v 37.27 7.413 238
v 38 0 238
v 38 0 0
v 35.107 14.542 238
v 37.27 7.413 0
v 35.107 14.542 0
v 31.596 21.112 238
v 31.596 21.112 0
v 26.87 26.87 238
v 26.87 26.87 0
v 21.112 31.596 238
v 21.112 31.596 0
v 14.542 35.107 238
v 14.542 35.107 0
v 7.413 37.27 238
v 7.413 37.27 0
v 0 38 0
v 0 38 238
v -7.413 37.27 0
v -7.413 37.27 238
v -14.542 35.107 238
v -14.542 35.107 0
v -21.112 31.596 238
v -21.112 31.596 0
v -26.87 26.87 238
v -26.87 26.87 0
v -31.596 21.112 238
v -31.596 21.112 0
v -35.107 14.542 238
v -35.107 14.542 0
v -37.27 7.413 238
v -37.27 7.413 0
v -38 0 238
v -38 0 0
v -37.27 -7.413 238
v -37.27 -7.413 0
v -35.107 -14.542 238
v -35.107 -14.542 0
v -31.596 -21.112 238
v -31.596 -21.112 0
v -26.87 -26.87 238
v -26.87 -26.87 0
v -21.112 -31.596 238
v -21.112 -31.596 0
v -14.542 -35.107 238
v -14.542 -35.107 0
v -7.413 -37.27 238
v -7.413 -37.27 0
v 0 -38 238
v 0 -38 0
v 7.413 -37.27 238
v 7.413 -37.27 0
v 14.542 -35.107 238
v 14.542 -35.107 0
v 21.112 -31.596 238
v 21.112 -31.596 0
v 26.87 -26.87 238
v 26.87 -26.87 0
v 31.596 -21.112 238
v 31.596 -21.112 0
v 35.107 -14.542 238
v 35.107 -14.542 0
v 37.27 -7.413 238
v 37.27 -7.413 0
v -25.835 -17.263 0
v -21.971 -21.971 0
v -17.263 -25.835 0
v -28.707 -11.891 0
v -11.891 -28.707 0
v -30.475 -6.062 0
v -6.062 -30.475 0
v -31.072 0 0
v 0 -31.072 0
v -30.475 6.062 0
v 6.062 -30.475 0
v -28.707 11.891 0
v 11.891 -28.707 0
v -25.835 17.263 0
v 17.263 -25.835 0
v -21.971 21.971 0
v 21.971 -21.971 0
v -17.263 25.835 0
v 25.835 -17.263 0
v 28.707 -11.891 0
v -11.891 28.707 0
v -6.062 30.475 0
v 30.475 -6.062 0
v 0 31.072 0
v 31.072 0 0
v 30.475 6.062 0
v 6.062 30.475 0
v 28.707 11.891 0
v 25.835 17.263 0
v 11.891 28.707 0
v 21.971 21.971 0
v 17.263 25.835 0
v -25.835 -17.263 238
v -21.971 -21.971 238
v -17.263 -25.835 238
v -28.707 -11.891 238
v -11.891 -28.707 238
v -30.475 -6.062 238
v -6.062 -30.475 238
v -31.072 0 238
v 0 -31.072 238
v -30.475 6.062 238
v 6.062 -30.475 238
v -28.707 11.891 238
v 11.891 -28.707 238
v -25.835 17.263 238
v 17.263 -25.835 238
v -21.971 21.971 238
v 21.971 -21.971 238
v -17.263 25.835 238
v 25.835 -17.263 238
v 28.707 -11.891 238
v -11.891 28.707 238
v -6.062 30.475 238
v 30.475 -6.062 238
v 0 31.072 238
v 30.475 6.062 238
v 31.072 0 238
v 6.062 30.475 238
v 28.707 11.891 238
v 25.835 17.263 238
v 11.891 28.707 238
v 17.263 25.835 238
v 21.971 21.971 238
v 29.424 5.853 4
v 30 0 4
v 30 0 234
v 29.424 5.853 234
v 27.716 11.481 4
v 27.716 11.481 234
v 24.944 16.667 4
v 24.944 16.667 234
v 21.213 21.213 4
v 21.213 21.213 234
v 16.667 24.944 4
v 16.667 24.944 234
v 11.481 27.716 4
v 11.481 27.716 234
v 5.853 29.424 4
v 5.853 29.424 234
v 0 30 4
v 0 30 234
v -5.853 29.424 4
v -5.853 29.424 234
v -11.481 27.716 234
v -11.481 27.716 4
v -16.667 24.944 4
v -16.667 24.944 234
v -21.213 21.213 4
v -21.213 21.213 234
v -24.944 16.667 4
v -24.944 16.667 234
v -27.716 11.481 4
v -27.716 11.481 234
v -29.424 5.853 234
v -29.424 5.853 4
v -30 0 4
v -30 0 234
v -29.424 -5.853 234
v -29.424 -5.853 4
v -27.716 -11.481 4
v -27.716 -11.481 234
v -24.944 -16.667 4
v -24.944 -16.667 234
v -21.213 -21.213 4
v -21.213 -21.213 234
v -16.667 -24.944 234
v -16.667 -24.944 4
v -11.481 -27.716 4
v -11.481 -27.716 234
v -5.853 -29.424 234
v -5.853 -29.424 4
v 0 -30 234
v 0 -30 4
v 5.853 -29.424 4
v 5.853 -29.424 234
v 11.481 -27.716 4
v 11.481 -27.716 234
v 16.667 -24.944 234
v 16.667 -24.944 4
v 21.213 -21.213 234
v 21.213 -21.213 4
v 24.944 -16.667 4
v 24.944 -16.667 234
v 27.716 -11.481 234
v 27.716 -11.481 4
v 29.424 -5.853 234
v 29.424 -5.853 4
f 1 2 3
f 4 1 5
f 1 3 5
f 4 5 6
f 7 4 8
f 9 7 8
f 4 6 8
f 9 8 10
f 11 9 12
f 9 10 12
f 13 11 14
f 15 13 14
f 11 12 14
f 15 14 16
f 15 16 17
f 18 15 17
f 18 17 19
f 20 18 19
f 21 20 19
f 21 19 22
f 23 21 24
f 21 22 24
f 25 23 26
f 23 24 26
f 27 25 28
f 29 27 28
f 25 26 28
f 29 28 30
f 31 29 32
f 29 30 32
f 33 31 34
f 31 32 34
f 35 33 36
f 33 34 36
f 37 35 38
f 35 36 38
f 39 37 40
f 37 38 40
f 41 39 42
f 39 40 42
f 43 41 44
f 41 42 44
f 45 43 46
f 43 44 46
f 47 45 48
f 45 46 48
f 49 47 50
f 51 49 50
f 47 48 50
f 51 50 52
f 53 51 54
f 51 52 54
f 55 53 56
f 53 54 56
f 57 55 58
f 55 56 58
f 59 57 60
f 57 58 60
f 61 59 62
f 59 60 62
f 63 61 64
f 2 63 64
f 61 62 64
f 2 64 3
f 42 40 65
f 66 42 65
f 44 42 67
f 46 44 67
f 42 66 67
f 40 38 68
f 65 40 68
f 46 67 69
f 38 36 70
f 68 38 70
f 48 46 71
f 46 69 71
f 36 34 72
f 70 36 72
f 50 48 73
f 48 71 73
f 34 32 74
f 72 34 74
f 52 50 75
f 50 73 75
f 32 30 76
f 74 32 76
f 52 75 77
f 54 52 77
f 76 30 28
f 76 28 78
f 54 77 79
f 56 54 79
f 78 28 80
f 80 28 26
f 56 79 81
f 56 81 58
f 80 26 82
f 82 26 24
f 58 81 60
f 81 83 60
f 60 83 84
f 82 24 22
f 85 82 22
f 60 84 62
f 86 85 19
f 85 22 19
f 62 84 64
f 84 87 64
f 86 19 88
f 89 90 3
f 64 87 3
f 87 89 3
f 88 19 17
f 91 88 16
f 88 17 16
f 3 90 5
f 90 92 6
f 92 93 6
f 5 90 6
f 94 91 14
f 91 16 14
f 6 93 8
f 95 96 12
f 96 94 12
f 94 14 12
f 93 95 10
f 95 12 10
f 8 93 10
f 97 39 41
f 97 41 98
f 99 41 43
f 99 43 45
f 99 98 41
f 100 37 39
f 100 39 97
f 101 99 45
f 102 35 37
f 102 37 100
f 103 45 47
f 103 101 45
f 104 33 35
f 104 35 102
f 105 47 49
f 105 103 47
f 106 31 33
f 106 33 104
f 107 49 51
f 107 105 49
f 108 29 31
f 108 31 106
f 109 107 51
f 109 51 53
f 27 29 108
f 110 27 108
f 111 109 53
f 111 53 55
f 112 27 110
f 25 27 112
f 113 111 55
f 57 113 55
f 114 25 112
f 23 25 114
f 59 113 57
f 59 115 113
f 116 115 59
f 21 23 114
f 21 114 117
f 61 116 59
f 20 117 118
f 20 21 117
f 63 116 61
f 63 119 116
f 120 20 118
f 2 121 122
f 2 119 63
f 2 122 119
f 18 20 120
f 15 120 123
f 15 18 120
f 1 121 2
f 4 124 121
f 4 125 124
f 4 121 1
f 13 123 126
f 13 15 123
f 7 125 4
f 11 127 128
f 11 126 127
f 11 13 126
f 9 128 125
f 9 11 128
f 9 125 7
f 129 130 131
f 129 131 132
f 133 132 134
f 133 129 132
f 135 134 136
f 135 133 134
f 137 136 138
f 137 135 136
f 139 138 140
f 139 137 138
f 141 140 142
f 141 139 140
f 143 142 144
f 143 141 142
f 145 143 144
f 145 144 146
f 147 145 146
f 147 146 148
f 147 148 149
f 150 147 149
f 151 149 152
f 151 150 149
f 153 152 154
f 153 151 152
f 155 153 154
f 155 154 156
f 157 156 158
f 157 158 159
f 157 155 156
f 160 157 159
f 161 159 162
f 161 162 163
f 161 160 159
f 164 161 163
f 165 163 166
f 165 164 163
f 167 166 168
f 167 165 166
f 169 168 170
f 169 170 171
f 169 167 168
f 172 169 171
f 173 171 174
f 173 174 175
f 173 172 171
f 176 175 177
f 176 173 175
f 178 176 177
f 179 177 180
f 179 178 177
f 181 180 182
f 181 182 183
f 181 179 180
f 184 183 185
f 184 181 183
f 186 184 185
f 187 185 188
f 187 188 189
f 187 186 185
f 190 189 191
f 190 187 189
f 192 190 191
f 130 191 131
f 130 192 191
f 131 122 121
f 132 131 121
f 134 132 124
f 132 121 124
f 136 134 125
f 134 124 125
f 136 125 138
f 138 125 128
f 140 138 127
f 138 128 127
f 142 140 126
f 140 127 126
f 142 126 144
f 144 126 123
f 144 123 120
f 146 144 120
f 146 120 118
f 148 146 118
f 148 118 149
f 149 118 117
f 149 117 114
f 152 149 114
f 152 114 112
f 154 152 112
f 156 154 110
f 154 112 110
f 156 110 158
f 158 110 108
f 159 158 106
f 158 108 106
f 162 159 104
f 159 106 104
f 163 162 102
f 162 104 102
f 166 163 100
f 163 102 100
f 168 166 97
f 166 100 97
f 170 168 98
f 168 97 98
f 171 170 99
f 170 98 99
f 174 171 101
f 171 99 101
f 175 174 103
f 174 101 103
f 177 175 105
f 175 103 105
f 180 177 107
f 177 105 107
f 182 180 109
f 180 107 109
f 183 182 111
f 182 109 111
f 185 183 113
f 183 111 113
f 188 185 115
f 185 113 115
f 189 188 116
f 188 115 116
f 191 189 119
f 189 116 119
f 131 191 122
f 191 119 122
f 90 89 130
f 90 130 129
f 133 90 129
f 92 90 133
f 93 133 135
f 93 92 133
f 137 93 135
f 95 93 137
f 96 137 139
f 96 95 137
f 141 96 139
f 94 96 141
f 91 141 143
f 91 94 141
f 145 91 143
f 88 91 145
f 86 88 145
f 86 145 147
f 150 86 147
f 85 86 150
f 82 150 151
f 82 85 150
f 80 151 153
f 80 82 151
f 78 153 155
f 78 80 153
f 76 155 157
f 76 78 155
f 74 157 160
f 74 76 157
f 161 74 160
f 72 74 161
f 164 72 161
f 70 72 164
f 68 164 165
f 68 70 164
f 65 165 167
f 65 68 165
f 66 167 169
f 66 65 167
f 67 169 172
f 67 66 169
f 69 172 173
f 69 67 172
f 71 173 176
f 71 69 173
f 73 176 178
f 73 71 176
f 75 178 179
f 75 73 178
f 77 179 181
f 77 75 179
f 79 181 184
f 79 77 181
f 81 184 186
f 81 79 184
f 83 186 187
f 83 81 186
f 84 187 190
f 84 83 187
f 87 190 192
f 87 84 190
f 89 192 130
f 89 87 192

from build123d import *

# Parameters (mm, degrees)
SKETCH1_R           = 38
SKETCH1_R_2         = 30
BOSS_EXTRUDE1_DEPTH = 238
CHAMFER1_SIZE       = 4
CHAMFER1_SIZE2      = 1.07179677
CHAMFER2_SIZE       = 4
CHAMFER2_SIZE2      = 1.07179677


with BuildPart() as part:
    # Sketch1 → Boss-Extrude1 (new body)
    with BuildSketch(Plane.XY):
        Circle(SKETCH1_R)
        Circle(SKETCH1_R_2, mode=Mode.SUBTRACT)
    extrude(amount=BOSS_EXTRUDE1_DEPTH)

    # Chamfer1
    chamfer1_edges = [part.edges().sort_by_distance(p)[0] for p in [
        (-30, 0, 0),
    ]]
    chamfer1_side = [part.faces().sort_by_distance(p)[0] for p in [
        (-30, 0, 119),
    ]]
    chamfer(chamfer1_edges, length=CHAMFER1_SIZE, length2=CHAMFER1_SIZE2, reference=chamfer1_side[0])

    # Chamfer2
    chamfer2_edges = [part.edges().sort_by_distance(p)[0] for p in [
        (-30, 0, 238),
    ]]
    chamfer2_side = [part.faces().sort_by_distance(p)[0] for p in [
        (-30, 0, 121),
    ]]
    chamfer(chamfer2_edges, length=CHAMFER2_SIZE, length2=CHAMFER2_SIZE2, reference=chamfer2_side[0])


solid = part.part
